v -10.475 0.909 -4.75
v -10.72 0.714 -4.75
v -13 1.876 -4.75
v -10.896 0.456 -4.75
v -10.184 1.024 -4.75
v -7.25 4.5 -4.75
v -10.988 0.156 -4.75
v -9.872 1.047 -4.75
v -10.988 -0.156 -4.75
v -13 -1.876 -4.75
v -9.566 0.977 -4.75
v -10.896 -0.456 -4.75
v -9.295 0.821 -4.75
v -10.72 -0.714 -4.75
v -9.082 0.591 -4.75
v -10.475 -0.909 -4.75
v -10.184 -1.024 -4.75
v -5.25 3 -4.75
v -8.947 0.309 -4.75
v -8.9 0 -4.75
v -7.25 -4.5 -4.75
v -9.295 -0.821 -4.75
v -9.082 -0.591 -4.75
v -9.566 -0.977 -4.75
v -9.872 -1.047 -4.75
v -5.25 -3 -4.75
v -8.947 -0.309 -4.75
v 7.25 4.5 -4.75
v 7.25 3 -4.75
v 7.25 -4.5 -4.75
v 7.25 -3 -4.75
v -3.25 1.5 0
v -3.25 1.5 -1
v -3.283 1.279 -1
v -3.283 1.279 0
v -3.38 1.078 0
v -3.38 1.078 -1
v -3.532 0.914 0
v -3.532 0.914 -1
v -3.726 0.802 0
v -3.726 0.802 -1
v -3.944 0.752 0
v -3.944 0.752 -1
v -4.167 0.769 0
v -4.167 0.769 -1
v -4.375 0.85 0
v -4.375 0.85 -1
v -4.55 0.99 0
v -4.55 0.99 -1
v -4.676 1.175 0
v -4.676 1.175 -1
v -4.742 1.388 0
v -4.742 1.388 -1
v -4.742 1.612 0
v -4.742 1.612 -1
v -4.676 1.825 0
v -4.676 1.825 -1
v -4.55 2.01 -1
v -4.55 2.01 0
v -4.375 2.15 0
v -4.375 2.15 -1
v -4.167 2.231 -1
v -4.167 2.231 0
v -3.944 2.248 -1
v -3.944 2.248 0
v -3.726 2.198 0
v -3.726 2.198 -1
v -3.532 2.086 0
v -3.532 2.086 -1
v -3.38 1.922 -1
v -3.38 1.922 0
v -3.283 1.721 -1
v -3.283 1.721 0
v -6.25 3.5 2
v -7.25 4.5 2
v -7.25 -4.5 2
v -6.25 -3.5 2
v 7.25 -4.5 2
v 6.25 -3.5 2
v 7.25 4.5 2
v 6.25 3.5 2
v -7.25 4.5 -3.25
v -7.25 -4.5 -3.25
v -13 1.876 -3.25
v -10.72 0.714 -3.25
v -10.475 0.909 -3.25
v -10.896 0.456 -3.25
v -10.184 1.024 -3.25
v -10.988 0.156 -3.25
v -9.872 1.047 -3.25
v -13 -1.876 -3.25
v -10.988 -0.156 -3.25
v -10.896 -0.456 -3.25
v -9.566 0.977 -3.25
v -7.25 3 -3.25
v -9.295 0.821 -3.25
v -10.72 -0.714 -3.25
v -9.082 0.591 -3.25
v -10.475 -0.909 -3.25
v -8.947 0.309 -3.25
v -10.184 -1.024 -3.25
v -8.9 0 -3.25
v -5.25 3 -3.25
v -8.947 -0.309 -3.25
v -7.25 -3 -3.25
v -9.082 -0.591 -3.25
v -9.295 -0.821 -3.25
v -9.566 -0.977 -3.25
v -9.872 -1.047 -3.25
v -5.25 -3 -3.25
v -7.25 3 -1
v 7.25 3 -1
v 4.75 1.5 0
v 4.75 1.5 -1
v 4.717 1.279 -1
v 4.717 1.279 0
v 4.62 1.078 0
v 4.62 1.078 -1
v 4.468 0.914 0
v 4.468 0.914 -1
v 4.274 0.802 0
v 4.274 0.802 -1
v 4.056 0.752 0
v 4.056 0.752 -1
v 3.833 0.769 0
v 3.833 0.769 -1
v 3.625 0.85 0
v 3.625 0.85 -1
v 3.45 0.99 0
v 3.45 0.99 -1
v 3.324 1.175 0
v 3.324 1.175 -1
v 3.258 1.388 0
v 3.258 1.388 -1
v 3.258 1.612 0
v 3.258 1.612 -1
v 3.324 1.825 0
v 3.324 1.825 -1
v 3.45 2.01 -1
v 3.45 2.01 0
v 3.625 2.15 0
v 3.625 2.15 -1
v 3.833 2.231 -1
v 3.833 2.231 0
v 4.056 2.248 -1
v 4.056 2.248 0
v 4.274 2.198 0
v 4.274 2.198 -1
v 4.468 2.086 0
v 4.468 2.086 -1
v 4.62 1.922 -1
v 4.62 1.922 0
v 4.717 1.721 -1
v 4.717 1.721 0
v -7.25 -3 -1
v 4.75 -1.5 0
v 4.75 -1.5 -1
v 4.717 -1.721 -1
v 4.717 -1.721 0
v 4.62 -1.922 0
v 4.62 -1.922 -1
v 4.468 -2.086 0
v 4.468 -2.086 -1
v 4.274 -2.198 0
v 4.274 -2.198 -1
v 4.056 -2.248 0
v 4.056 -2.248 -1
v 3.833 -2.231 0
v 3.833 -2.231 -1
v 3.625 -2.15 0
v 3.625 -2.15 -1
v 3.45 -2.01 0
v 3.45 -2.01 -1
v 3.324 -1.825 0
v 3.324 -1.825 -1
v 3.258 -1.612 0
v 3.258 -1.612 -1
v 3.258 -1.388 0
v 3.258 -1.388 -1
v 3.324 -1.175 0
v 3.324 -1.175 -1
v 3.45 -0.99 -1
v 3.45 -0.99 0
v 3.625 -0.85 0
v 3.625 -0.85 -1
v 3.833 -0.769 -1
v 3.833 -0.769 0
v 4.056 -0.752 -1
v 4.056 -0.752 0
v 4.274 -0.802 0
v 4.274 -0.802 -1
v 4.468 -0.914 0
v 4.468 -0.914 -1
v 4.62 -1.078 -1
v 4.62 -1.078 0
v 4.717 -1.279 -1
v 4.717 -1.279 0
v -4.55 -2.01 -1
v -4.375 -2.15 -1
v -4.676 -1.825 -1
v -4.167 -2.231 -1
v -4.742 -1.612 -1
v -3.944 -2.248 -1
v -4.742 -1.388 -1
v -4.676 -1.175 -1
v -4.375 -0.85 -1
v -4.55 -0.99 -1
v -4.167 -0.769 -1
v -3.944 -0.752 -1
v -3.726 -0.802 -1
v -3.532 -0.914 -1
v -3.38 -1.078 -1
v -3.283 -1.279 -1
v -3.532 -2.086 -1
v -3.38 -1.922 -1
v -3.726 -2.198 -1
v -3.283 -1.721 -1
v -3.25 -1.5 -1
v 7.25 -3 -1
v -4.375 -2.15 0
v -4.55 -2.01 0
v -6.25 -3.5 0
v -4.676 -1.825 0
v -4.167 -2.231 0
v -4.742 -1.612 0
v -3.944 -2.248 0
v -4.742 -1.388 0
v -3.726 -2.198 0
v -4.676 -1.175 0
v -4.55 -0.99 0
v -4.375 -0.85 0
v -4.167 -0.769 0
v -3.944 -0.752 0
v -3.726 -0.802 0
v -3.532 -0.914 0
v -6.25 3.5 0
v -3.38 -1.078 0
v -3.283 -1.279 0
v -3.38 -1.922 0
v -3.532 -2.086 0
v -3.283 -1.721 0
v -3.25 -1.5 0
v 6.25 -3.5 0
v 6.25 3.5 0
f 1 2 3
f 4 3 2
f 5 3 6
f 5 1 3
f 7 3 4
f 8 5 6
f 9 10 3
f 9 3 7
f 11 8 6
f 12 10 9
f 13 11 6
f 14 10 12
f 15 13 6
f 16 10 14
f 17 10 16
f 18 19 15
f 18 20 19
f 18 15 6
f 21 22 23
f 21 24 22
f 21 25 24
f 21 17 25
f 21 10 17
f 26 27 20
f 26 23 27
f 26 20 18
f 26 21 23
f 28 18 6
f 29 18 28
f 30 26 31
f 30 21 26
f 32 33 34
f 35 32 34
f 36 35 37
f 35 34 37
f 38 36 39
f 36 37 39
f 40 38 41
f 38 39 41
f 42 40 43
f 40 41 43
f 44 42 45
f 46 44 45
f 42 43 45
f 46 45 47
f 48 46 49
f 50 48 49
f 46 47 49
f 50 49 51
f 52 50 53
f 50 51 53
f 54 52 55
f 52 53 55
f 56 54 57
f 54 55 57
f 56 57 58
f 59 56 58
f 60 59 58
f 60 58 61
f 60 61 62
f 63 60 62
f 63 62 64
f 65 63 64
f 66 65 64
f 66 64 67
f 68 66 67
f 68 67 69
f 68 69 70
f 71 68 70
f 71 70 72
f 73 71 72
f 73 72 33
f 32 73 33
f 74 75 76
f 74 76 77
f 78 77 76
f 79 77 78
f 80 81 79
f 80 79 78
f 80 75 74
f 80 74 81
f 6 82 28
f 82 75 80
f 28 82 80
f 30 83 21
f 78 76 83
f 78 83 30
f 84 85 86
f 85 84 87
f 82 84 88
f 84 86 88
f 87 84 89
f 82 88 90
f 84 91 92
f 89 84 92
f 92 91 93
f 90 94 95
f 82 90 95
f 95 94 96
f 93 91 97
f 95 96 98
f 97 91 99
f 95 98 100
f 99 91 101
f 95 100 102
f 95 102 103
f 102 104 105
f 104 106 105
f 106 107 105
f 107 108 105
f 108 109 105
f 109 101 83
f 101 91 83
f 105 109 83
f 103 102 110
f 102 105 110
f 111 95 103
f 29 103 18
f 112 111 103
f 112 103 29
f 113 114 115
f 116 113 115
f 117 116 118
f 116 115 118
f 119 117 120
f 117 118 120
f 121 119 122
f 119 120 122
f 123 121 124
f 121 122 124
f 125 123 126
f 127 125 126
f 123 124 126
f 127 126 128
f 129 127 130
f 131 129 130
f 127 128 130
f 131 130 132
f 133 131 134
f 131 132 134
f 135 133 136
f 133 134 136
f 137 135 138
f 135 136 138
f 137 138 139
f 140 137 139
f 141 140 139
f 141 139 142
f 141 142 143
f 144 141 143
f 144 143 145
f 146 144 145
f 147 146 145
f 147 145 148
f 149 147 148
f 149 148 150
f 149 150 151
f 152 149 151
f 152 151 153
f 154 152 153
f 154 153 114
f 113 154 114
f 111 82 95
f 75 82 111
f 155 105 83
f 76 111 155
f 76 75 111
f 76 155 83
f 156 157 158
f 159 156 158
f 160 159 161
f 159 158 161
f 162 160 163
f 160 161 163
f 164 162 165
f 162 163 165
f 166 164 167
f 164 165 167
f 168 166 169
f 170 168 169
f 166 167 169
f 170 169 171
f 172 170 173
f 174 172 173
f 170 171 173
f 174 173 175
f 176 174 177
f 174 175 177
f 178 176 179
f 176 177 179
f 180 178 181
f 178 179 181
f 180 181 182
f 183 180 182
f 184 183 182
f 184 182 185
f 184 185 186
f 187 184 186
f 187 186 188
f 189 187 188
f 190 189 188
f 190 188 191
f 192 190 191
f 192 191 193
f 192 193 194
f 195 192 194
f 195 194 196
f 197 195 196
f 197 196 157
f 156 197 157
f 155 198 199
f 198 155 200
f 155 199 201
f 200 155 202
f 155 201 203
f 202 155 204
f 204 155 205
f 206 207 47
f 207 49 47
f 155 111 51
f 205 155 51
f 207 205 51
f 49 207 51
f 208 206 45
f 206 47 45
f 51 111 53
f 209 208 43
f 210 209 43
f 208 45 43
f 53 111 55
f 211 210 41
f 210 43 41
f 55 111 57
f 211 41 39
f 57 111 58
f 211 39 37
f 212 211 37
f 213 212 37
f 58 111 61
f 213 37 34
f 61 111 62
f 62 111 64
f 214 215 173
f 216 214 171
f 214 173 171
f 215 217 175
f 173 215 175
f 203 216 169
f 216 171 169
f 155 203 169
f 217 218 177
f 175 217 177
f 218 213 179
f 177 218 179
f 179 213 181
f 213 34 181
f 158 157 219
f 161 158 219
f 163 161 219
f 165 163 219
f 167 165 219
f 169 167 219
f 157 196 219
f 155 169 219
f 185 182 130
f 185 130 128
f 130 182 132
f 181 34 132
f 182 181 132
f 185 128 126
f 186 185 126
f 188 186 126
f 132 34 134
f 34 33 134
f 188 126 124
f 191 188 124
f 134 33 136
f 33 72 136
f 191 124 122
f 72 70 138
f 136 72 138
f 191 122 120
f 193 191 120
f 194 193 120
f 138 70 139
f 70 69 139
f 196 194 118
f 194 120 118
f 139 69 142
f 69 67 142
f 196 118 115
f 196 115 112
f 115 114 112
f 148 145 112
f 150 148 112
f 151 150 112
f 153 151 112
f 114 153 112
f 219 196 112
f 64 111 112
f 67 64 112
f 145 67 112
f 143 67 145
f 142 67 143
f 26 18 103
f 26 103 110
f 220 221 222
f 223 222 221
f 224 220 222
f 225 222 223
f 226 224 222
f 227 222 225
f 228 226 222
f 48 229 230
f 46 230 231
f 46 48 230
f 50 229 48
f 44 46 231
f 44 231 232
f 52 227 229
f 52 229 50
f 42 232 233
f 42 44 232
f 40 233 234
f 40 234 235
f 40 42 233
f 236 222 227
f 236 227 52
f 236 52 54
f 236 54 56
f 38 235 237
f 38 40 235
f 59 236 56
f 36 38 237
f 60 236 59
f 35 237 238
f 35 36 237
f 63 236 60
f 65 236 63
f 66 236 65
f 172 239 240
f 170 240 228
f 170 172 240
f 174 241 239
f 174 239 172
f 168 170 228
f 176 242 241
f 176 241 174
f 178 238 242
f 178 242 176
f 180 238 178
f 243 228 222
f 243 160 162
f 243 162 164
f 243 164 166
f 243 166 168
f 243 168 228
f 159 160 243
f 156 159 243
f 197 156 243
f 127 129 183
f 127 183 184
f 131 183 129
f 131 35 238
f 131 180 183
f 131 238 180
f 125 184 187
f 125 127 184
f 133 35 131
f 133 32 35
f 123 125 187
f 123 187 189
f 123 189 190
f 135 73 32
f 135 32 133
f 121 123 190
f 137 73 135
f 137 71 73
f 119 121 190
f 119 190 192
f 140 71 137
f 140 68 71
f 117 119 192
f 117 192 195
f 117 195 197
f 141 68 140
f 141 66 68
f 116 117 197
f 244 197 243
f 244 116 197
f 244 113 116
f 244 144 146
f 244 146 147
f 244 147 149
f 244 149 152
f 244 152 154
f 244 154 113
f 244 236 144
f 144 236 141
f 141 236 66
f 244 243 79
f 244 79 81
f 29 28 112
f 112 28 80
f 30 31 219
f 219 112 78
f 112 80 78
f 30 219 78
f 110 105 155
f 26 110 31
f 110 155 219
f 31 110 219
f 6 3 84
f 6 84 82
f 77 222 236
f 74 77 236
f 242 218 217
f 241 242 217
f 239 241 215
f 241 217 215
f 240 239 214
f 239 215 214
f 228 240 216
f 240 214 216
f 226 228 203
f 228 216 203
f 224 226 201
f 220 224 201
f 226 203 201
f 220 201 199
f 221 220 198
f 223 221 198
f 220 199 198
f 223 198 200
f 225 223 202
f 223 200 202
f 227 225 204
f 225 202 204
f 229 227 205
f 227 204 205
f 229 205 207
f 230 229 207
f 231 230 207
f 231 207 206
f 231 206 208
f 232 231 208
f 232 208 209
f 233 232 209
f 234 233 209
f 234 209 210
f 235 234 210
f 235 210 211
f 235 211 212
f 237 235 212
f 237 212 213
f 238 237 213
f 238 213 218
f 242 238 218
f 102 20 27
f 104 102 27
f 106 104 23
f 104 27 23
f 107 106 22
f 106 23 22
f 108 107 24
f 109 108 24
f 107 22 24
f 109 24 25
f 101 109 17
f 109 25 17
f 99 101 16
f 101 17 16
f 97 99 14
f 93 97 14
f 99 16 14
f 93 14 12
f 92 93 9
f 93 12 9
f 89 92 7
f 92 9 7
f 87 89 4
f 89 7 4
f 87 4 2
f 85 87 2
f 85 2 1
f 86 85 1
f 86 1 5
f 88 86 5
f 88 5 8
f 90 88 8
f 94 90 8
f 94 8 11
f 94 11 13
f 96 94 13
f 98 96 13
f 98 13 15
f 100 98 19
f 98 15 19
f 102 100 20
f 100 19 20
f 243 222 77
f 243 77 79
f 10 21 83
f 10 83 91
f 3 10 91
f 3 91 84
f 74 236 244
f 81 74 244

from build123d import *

# Parameters (mm, degrees)
F0_W     = 14.5
F0_H     = 9
F0_W_2   = 12.5
F0_H_2   = 7
F1_DEPTH = 2
F2_DEPTH = 1
F3_R     = 0.75
F4_DEPTH = 3.001
F5_W     = 14.5
F5_H     = 1.5
F6_DEPTH = 3.75
F7_R     = 1.05
F7_W     = 2
F7_H     = 9
F8_DEPTH = 1.5


with BuildPart() as f1:
    # F0 (on Top) → F1 (new body)
    with BuildSketch(Plane.XY):
        Rectangle(F0_W, F0_H)
        Rectangle(F0_W_2, F0_H_2, mode=Mode.SUBTRACT)
    extrude(amount=F1_DEPTH)

    # F0 (on Top) → F2 (join)
    with BuildSketch(Plane.XY):
        Rectangle(F0_W, F0_H)
        Rectangle(F0_W_2, F0_H_2, mode=Mode.SUBTRACT)
        Rectangle(F0_W_2, F0_H_2)
    extrude(amount=-F2_DEPTH)

    # F3 (on face) → F4 (cut, through all)
    with BuildSketch(Plane(origin=(0, 0, -1), x_dir=(1, 0, 0), z_dir=(0, 0, -1))):
        with Locations((-4, 1.5)):
            Circle(F3_R)
        with Locations((4, 1.5)):
            Circle(F3_R)
        with Locations((4, -1.5)):
            Circle(F3_R)
        with Locations((-4, -1.5)):
            Circle(F3_R)
    extrude(amount=-F4_DEPTH, mode=Mode.SUBTRACT)

    # F5 (on face) → F6 (join)
    with BuildSketch(Plane(origin=(0, 0, -1), x_dir=(1, 0, 0), z_dir=(0, 0, -1))):
        with Locations((0, 3.75)):
            Rectangle(F5_W, F5_H)
        with Locations((0, -3.75)):
            Rectangle(F5_W, F5_H)
    extrude(amount=F6_DEPTH)

    # F7 (on face) → F8 (join)
    with BuildSketch(Plane(origin=(0, 0, -4.75), x_dir=(1, 0, 0), z_dir=(0, 0, -1))):
        Polygon((-13, -1.8759706765), (-7.25, -4.5), (-7.25, 4.5), (-13, 1.8759706765), align=None)
        with Locations((-9.95, 0)):
            Circle(F7_R, mode=Mode.SUBTRACT)
        with Locations((-6.25, 0)):
            Rectangle(F7_W, F7_H)
    extrude(amount=-F8_DEPTH)


solid = f1.part
